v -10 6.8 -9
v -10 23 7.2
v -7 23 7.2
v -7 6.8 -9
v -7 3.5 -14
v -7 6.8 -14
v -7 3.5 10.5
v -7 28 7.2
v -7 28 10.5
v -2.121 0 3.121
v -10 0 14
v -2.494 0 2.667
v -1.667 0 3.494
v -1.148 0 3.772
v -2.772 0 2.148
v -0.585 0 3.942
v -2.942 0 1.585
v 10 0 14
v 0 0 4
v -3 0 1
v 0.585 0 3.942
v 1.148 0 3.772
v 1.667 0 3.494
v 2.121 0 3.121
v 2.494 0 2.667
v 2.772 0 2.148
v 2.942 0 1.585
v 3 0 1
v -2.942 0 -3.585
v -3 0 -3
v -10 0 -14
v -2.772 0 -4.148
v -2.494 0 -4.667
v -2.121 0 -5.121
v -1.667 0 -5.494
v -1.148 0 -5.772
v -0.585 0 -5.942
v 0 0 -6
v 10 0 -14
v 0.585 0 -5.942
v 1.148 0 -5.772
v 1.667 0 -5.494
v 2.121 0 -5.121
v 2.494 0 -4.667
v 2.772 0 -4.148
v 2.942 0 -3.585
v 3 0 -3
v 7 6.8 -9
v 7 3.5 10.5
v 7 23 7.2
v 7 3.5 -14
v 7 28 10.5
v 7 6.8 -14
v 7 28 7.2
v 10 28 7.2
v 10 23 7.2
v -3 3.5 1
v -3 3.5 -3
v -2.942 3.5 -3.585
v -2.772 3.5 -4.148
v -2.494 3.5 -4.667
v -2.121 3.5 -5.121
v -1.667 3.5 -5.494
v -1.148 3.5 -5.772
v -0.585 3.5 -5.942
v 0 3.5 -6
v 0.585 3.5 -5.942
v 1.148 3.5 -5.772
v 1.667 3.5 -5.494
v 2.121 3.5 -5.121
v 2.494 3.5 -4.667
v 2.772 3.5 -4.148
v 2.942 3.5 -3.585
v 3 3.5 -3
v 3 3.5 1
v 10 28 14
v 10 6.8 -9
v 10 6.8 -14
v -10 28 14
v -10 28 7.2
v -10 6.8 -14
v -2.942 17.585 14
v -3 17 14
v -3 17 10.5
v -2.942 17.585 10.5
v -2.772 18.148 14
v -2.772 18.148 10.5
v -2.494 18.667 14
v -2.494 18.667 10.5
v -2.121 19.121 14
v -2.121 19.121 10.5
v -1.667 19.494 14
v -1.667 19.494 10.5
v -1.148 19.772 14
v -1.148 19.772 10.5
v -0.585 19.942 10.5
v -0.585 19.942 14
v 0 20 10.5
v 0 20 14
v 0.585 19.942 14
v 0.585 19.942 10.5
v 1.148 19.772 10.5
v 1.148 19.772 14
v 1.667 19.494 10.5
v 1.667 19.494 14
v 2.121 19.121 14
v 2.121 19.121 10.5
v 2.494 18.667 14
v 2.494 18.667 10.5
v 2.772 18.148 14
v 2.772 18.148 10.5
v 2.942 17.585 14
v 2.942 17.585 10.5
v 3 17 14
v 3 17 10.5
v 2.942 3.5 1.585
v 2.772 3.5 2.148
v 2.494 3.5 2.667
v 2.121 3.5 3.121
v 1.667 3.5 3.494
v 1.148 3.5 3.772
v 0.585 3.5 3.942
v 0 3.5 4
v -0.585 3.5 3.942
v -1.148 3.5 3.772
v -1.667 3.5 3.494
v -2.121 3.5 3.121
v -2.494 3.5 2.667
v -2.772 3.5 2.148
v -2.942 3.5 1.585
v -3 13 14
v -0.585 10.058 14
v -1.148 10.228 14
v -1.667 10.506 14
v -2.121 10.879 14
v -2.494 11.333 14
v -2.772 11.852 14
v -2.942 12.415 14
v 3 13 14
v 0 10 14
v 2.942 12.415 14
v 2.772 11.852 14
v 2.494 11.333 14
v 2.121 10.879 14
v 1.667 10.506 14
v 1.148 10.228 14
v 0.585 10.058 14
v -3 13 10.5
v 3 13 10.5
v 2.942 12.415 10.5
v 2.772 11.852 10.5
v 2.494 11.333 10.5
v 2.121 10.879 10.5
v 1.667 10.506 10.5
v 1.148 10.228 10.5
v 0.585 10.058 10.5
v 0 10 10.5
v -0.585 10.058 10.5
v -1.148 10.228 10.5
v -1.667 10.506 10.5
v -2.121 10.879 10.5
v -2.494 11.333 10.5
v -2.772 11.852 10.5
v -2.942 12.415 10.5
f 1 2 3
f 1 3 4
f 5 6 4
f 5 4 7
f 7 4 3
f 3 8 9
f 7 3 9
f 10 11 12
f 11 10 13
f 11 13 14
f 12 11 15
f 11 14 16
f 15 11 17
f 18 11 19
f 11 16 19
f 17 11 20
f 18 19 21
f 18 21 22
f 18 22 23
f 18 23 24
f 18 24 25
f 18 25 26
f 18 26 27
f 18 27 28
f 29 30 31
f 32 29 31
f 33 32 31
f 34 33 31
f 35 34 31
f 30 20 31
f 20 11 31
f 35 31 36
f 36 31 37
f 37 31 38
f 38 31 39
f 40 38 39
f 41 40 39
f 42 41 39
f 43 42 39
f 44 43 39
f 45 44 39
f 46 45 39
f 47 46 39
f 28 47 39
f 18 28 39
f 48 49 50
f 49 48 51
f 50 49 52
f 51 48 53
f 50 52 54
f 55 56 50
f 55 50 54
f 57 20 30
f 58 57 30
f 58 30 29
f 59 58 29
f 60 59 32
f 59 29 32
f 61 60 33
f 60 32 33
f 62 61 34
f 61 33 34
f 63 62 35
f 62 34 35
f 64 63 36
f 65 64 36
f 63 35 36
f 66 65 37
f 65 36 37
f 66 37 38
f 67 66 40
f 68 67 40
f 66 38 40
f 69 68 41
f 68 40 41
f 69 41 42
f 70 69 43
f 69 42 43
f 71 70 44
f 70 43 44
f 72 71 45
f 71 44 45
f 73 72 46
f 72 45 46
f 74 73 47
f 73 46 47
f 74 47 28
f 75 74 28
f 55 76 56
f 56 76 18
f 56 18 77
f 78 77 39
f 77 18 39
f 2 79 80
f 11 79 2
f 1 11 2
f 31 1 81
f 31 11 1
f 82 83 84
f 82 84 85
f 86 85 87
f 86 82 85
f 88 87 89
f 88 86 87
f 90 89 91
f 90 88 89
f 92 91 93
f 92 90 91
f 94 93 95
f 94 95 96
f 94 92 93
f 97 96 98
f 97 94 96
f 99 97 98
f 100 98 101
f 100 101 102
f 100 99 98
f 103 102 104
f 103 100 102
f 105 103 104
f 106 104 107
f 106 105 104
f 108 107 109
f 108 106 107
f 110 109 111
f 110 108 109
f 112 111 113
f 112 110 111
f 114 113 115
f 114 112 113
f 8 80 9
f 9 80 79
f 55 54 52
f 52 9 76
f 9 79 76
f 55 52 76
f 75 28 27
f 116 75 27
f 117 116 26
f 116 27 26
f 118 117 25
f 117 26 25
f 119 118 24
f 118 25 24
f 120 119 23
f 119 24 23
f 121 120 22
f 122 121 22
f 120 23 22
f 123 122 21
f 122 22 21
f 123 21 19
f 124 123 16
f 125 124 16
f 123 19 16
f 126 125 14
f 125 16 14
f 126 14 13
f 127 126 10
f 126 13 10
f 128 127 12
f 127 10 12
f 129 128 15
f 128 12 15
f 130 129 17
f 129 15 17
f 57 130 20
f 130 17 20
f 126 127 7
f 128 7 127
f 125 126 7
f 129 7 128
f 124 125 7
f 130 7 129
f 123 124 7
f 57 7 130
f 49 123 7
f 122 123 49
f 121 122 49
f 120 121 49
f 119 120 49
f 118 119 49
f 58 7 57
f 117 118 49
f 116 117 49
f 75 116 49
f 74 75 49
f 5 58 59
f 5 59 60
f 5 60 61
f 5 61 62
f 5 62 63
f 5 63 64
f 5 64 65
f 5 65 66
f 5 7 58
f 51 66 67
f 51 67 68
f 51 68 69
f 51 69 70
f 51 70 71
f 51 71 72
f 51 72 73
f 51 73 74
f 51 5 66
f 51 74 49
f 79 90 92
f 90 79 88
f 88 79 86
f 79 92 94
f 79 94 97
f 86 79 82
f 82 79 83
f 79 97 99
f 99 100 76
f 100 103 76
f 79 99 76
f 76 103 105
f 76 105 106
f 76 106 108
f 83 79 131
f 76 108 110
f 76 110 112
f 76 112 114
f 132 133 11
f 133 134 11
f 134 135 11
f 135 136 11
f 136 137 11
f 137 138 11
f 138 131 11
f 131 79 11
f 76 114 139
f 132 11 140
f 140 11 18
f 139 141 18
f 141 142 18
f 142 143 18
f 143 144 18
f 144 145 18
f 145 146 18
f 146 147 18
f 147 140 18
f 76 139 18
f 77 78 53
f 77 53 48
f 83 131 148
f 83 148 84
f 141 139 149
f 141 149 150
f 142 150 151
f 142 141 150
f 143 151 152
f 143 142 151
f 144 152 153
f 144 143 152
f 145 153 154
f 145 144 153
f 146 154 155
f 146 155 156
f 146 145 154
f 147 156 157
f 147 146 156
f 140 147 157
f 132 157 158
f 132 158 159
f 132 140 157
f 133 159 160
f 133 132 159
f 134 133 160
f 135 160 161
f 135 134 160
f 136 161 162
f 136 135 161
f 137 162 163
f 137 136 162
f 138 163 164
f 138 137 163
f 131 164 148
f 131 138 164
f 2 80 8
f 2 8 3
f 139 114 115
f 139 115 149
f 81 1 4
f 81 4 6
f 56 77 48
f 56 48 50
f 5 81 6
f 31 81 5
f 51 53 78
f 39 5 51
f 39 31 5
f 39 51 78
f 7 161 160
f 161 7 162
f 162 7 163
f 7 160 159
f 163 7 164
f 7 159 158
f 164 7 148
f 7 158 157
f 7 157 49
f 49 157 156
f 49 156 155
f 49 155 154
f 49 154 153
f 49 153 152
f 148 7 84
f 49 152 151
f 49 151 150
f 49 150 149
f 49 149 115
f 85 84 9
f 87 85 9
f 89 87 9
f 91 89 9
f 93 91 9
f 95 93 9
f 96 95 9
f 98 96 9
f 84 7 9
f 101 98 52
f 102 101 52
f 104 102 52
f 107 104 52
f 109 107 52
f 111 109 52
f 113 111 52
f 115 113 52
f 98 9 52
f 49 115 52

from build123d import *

# Parameters (mm, degrees)
SKETCH2_W           = 20
SKETCH2_H           = 28
BOSS_EXTRUDE1_DEPTH = 3.5
SKETCH3_W           = 20
SKETCH3_H           = 28
BOSS_EXTRUDE2_DEPTH = 3.5
BOSS_EXTRUDE3_DEPTH = 3
BOSS_EXTRUDE4_DEPTH = 3


with BuildPart() as part:
    # Sketch2 → Boss-Extrude1 (new body)
    with BuildSketch(Plane(origin=(0, 0, 0), x_dir=(1, 0, 0), z_dir=(0, 1, 0))):
        Rectangle(SKETCH2_W, SKETCH2_H)
        with BuildLine():
            Line((-3, -1), (-3, 3))
            ThreePointArc((-3, 3), (0, 6), (3, 3))
            Line((3, 3), (3, -1))
            ThreePointArc((3, -1), (0, -4), (-3, -1))
        make_face(mode=Mode.SUBTRACT)
    extrude(amount=BOSS_EXTRUDE1_DEPTH)

    # Sketch3 → Boss-Extrude2 (add)
    with BuildSketch(Plane.XY.offset(14)):
        with Locations((0, 14)):
            Rectangle(SKETCH3_W, SKETCH3_H)
        with BuildLine():
            Line((3, 17), (3, 13))
            ThreePointArc((3, 13), (0, 10), (-3, 13))
            Line((-3, 13), (-3, 17))
            ThreePointArc((-3, 17), (0, 20), (3, 17))
        make_face(mode=Mode.SUBTRACT)
    extrude(amount=-BOSS_EXTRUDE2_DEPTH)

    # Sketch4 → Boss-Extrude3 (add)
    with BuildSketch(Plane(origin=(10, 0, 0), x_dir=(0, 0, -1), z_dir=(1, 0, 0))):
        Polygon((-14, 0), (14, 0), (14, 6.8), (9, 6.8), (-7.2, 23), (-7.2, 28), (-14, 28), align=None)
    extrude(amount=-BOSS_EXTRUDE3_DEPTH)

    # Sketch5 → Boss-Extrude4 (add)
    with BuildSketch(Plane.ZY.offset(10)):
        Polygon((-14, 0), (14, 0), (14, 28), (7.2, 28), (7.2, 23), (-9, 6.8), (-14, 6.8), align=None)
    extrude(amount=-BOSS_EXTRUDE4_DEPTH)


solid = part.part
